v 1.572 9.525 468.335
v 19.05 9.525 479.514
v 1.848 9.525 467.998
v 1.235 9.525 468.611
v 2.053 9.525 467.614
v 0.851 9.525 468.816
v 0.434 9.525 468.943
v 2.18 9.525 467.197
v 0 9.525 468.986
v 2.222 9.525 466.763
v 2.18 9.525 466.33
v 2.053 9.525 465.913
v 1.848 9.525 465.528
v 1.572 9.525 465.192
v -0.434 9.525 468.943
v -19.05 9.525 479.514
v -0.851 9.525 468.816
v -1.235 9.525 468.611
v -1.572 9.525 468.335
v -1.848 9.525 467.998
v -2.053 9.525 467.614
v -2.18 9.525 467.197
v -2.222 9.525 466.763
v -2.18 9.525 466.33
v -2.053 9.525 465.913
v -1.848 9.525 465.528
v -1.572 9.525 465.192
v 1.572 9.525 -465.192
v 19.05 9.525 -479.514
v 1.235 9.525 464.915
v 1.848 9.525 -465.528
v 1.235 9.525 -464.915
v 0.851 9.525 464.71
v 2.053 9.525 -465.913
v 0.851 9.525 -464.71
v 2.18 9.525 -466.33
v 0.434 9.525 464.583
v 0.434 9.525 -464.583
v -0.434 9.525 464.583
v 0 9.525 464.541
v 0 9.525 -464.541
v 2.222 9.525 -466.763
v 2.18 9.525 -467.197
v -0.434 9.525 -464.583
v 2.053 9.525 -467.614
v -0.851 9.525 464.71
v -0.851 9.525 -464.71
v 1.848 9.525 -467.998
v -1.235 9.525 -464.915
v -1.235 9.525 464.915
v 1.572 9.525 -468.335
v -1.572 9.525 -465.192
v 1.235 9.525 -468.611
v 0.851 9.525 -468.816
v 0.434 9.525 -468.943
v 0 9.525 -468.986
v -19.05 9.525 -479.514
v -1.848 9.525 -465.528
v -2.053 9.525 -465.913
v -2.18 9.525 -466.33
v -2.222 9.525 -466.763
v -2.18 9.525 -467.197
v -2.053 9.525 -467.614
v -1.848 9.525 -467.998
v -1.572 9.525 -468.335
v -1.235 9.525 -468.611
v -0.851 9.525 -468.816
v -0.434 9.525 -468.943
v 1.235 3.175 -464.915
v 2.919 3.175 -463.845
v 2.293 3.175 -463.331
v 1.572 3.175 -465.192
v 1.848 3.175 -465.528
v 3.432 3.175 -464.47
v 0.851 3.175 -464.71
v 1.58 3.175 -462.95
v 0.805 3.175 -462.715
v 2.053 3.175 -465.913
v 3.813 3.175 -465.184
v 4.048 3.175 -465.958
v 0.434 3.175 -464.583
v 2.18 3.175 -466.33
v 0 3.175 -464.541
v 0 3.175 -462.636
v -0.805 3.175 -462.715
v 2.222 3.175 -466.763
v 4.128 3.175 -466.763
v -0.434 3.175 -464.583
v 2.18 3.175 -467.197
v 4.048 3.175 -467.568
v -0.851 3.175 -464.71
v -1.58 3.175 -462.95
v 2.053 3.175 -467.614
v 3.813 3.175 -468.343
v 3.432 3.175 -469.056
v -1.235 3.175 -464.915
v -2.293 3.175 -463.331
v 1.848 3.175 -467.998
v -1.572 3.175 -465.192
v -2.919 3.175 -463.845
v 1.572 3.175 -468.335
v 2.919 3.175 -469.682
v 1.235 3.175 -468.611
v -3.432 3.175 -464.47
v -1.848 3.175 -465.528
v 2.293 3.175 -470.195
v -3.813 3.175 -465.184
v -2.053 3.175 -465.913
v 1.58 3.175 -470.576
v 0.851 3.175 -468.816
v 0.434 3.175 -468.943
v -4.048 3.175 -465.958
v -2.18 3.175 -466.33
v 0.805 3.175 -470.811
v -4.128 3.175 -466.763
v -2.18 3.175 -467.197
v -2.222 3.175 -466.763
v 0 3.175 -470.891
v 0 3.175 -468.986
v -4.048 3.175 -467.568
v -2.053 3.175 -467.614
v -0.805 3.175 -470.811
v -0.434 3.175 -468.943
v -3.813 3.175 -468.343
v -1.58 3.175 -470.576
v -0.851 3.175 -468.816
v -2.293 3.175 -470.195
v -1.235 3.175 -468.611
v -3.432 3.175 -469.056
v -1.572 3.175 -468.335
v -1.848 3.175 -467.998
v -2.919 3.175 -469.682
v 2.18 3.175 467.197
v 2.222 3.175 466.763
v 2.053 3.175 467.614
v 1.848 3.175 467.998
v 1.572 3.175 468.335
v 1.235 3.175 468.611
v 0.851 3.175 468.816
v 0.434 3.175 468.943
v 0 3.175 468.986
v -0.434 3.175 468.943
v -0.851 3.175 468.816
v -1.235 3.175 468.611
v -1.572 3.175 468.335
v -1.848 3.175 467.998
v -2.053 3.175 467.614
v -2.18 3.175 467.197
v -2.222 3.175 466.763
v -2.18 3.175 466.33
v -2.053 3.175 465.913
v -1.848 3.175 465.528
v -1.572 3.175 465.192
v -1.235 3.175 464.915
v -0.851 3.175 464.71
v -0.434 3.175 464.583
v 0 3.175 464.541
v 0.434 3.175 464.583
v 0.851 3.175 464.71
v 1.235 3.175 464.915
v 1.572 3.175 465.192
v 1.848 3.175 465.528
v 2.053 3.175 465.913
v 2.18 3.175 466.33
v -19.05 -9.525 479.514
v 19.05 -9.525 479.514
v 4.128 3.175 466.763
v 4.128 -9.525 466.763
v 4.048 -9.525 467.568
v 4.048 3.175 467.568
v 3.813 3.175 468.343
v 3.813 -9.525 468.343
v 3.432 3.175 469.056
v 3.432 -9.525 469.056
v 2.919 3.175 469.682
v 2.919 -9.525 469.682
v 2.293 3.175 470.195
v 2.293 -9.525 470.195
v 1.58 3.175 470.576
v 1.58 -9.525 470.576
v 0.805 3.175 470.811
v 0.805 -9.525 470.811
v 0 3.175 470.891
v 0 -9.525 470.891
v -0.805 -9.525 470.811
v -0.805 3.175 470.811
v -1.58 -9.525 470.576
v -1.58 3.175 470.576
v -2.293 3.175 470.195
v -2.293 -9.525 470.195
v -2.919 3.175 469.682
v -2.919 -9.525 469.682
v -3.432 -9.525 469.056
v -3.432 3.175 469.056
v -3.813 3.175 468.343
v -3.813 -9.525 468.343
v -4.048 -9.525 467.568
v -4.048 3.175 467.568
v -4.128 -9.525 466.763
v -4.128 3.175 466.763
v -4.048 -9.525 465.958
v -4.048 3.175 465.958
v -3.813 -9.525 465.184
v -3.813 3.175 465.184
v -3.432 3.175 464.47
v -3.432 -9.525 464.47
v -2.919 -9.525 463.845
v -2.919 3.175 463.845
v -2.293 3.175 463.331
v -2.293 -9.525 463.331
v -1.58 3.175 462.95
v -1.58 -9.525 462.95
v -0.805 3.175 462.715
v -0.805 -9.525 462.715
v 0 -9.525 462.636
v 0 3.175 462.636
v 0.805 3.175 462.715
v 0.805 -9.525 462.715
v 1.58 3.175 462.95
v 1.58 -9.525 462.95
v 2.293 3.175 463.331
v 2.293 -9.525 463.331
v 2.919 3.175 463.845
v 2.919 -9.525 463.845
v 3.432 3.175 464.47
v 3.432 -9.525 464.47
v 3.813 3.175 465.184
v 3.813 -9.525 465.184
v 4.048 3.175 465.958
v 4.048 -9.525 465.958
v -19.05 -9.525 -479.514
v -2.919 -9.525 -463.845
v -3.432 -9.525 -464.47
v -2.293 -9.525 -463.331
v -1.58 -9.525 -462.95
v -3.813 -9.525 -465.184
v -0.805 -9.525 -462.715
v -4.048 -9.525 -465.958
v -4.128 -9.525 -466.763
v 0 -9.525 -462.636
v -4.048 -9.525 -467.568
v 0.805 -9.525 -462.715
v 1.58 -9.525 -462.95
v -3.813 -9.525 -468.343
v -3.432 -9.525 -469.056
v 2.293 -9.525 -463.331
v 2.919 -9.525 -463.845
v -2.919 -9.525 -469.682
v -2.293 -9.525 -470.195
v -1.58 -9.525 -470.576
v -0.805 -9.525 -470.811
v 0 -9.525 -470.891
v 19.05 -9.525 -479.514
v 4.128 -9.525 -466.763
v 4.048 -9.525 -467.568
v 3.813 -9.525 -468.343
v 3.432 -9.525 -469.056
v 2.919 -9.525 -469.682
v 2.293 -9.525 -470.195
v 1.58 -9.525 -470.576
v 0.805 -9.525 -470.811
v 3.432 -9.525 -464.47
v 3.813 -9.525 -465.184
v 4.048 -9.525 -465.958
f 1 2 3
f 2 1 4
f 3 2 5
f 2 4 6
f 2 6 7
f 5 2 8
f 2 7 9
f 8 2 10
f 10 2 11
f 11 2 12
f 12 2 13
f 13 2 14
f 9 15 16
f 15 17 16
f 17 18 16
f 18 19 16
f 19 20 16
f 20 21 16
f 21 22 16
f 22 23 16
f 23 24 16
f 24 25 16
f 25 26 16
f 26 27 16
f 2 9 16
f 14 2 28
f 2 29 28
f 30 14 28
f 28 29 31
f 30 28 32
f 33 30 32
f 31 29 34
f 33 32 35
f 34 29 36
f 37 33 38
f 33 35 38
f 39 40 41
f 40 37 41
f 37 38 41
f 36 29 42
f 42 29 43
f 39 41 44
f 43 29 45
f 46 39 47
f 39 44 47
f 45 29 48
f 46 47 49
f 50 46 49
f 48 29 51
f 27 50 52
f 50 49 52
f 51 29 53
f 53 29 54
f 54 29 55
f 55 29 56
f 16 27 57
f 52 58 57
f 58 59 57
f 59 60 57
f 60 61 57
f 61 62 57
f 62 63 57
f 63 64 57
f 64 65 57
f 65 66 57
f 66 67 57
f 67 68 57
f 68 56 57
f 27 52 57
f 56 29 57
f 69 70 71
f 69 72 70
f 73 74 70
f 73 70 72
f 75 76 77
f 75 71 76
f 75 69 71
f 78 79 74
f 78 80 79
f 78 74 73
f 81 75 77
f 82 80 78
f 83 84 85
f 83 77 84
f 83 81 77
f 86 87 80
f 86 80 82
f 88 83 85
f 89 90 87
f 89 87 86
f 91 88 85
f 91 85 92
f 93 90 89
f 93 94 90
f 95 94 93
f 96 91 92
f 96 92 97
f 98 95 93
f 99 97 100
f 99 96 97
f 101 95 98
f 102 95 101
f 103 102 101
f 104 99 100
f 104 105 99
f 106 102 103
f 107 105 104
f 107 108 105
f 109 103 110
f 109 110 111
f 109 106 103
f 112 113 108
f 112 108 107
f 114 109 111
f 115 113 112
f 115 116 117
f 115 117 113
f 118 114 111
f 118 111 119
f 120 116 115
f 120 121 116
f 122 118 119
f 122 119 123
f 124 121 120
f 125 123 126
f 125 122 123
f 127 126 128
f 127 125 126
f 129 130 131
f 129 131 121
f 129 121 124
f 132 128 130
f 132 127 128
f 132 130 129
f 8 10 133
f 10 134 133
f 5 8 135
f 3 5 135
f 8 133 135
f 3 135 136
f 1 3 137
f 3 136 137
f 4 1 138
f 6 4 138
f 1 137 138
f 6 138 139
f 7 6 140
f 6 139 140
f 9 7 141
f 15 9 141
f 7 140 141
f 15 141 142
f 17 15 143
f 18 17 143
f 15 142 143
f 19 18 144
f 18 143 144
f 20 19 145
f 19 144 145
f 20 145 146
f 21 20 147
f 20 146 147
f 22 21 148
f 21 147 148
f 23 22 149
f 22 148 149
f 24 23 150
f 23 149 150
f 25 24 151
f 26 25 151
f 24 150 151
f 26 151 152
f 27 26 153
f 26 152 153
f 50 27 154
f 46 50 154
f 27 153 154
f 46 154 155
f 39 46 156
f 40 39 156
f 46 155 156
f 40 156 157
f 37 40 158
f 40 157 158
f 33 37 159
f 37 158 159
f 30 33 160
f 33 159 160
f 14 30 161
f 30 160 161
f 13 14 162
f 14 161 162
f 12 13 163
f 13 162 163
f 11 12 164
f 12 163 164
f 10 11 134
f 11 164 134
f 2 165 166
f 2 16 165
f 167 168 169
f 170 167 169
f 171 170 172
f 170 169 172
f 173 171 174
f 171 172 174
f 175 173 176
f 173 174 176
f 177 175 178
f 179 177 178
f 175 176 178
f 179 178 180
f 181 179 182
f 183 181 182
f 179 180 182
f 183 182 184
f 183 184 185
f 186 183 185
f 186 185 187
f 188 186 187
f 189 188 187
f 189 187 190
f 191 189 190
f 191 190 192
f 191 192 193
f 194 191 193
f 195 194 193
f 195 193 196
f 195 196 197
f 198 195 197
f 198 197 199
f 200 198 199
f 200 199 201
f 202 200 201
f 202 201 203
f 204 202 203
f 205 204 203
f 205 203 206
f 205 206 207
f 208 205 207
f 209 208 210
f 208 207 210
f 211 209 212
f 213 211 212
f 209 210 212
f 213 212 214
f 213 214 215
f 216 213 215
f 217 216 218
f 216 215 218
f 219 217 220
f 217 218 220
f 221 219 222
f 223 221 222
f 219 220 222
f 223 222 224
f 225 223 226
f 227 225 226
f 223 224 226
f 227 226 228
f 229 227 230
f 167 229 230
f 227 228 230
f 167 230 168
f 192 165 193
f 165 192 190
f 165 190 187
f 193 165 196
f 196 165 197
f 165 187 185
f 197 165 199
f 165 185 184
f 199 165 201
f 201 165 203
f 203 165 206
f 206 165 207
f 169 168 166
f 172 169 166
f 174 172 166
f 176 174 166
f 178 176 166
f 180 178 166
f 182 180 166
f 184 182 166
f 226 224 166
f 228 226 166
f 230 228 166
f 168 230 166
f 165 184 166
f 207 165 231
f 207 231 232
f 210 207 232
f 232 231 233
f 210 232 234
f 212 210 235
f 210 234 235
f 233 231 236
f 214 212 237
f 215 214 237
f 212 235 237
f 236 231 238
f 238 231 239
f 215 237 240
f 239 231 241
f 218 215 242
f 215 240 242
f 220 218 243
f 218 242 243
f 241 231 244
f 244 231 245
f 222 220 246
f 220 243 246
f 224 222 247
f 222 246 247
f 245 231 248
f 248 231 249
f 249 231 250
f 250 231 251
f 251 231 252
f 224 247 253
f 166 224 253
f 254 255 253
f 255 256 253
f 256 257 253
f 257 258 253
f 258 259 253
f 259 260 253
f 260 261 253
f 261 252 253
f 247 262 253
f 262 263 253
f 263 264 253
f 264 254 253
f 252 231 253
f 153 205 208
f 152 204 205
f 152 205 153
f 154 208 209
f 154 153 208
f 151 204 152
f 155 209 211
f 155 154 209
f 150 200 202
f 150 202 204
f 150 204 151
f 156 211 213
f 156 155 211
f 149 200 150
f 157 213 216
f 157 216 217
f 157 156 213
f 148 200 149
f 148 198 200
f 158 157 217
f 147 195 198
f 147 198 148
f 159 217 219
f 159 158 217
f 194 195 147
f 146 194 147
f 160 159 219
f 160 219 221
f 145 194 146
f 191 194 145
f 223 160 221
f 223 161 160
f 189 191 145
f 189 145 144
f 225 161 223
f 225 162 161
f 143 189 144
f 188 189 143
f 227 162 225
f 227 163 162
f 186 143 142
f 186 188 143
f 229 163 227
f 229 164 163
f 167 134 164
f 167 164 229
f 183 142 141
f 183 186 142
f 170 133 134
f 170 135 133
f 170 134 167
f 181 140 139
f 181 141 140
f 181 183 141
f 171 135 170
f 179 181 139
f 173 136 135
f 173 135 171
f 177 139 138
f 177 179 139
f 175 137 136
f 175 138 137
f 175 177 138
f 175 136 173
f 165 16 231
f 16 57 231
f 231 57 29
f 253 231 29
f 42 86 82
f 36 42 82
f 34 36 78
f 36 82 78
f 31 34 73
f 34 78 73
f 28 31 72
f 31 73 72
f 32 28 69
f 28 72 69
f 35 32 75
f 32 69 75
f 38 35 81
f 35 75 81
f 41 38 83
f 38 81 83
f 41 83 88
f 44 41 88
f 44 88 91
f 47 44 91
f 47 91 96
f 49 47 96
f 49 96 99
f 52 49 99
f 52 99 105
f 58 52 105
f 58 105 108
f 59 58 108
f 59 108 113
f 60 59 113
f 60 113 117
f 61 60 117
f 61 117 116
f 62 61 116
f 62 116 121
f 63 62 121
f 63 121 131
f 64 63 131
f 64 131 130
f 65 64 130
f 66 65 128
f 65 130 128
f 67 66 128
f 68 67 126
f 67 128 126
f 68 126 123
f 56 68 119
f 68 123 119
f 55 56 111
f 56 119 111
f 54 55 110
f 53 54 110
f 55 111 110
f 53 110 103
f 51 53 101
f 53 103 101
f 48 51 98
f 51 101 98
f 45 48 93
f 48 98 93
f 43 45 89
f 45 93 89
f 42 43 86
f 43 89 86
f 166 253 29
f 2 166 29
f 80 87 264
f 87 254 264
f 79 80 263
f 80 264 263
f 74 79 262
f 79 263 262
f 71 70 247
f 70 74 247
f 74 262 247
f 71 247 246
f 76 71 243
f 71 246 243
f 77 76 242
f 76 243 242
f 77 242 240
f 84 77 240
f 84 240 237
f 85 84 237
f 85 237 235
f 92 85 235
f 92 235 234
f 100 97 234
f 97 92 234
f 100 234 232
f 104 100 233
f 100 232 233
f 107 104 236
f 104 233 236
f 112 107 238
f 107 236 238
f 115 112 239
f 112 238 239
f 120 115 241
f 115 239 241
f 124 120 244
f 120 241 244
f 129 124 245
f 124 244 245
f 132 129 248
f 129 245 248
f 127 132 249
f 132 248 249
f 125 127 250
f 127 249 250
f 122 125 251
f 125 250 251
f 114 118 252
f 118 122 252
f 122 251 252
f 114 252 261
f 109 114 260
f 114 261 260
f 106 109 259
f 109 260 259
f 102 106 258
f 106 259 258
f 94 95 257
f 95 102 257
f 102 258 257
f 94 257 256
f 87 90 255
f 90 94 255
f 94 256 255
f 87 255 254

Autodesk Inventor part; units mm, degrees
ref_plane "YZ Plane" through (0, 0, 0) normal (1, 0, 0) x (0, 1, 0)
ref_plane "XZ Plane" through (0, 0, 0) normal (0, 1, 0) x (-1, 0, 0)
ref_plane "XY Plane" through (0, 0, 0) normal (0, 0, 1) x (1, 0, 0)
sketch "Sketch1" plane through (0, 0, 0) normal (0, 0, 1) x (1, 0, 0)
  line L0 (-19.05, -9.525) -> (19.05, -9.525)
  line L1 (19.05, -9.525) -> (19.05, 9.525)
  line L2 (19.05, 9.525) -> (-19.05, 9.525)
  line L3 (-19.05, 9.525) -> (-19.05, -9.525)
  line L4 (-19.05, -9.525) -> (19.05, 9.525) construction
  line L5 (19.05, -9.525) -> (-19.05, 9.525) construction
  point P0 (0, 0)
  dimension "d0" = 38.1
  dimension "d1" = 19.05
extrude "Extrusion1" add sketch "Sketch1" along normal mid plane 959.0278
sketch "Sketch2" plane through (-19.05, -9.525, 479.5139) normal (0, -1, 0) x (1, 0, 0)
  circle A0 centre (19.05, -12.7508) radius 2.2225
  line L0 (0, 0) -> (38.1, 0) projected
  line L1 (0, 0) -> (0, -959.0278) projected
  point P0 (19.05, -479.5139)
  dimension "d4" = 4.445
  dimension "d5" = 12.7508
  dimension "d6" = 19.05
extrude "Extrusion2" cut sketch "Sketch2" against normal blind 25.4
sketch "Sketch3" plane through (-19.05, -9.525, 479.5139) normal (0, -1, 0) x (1, 0, 0)
  circle A0 centre (19.05, -12.7508) radius 2.2225 projected
  circle A1 centre (19.05, -12.7508) radius 4.1275
  point P0 (19.05, -479.5139)
  dimension "d9" = 8.255
extrude "Extrusion3" cut sketch "Sketch3" against normal blind 12.7
mirror "Mirror1" about plane through (0, 0, 0) normal (0, 0, 1) of "Extrusion2", "Extrusion3"
properties part number "1x2 Longitudinal" material "Wood (Birch)"
